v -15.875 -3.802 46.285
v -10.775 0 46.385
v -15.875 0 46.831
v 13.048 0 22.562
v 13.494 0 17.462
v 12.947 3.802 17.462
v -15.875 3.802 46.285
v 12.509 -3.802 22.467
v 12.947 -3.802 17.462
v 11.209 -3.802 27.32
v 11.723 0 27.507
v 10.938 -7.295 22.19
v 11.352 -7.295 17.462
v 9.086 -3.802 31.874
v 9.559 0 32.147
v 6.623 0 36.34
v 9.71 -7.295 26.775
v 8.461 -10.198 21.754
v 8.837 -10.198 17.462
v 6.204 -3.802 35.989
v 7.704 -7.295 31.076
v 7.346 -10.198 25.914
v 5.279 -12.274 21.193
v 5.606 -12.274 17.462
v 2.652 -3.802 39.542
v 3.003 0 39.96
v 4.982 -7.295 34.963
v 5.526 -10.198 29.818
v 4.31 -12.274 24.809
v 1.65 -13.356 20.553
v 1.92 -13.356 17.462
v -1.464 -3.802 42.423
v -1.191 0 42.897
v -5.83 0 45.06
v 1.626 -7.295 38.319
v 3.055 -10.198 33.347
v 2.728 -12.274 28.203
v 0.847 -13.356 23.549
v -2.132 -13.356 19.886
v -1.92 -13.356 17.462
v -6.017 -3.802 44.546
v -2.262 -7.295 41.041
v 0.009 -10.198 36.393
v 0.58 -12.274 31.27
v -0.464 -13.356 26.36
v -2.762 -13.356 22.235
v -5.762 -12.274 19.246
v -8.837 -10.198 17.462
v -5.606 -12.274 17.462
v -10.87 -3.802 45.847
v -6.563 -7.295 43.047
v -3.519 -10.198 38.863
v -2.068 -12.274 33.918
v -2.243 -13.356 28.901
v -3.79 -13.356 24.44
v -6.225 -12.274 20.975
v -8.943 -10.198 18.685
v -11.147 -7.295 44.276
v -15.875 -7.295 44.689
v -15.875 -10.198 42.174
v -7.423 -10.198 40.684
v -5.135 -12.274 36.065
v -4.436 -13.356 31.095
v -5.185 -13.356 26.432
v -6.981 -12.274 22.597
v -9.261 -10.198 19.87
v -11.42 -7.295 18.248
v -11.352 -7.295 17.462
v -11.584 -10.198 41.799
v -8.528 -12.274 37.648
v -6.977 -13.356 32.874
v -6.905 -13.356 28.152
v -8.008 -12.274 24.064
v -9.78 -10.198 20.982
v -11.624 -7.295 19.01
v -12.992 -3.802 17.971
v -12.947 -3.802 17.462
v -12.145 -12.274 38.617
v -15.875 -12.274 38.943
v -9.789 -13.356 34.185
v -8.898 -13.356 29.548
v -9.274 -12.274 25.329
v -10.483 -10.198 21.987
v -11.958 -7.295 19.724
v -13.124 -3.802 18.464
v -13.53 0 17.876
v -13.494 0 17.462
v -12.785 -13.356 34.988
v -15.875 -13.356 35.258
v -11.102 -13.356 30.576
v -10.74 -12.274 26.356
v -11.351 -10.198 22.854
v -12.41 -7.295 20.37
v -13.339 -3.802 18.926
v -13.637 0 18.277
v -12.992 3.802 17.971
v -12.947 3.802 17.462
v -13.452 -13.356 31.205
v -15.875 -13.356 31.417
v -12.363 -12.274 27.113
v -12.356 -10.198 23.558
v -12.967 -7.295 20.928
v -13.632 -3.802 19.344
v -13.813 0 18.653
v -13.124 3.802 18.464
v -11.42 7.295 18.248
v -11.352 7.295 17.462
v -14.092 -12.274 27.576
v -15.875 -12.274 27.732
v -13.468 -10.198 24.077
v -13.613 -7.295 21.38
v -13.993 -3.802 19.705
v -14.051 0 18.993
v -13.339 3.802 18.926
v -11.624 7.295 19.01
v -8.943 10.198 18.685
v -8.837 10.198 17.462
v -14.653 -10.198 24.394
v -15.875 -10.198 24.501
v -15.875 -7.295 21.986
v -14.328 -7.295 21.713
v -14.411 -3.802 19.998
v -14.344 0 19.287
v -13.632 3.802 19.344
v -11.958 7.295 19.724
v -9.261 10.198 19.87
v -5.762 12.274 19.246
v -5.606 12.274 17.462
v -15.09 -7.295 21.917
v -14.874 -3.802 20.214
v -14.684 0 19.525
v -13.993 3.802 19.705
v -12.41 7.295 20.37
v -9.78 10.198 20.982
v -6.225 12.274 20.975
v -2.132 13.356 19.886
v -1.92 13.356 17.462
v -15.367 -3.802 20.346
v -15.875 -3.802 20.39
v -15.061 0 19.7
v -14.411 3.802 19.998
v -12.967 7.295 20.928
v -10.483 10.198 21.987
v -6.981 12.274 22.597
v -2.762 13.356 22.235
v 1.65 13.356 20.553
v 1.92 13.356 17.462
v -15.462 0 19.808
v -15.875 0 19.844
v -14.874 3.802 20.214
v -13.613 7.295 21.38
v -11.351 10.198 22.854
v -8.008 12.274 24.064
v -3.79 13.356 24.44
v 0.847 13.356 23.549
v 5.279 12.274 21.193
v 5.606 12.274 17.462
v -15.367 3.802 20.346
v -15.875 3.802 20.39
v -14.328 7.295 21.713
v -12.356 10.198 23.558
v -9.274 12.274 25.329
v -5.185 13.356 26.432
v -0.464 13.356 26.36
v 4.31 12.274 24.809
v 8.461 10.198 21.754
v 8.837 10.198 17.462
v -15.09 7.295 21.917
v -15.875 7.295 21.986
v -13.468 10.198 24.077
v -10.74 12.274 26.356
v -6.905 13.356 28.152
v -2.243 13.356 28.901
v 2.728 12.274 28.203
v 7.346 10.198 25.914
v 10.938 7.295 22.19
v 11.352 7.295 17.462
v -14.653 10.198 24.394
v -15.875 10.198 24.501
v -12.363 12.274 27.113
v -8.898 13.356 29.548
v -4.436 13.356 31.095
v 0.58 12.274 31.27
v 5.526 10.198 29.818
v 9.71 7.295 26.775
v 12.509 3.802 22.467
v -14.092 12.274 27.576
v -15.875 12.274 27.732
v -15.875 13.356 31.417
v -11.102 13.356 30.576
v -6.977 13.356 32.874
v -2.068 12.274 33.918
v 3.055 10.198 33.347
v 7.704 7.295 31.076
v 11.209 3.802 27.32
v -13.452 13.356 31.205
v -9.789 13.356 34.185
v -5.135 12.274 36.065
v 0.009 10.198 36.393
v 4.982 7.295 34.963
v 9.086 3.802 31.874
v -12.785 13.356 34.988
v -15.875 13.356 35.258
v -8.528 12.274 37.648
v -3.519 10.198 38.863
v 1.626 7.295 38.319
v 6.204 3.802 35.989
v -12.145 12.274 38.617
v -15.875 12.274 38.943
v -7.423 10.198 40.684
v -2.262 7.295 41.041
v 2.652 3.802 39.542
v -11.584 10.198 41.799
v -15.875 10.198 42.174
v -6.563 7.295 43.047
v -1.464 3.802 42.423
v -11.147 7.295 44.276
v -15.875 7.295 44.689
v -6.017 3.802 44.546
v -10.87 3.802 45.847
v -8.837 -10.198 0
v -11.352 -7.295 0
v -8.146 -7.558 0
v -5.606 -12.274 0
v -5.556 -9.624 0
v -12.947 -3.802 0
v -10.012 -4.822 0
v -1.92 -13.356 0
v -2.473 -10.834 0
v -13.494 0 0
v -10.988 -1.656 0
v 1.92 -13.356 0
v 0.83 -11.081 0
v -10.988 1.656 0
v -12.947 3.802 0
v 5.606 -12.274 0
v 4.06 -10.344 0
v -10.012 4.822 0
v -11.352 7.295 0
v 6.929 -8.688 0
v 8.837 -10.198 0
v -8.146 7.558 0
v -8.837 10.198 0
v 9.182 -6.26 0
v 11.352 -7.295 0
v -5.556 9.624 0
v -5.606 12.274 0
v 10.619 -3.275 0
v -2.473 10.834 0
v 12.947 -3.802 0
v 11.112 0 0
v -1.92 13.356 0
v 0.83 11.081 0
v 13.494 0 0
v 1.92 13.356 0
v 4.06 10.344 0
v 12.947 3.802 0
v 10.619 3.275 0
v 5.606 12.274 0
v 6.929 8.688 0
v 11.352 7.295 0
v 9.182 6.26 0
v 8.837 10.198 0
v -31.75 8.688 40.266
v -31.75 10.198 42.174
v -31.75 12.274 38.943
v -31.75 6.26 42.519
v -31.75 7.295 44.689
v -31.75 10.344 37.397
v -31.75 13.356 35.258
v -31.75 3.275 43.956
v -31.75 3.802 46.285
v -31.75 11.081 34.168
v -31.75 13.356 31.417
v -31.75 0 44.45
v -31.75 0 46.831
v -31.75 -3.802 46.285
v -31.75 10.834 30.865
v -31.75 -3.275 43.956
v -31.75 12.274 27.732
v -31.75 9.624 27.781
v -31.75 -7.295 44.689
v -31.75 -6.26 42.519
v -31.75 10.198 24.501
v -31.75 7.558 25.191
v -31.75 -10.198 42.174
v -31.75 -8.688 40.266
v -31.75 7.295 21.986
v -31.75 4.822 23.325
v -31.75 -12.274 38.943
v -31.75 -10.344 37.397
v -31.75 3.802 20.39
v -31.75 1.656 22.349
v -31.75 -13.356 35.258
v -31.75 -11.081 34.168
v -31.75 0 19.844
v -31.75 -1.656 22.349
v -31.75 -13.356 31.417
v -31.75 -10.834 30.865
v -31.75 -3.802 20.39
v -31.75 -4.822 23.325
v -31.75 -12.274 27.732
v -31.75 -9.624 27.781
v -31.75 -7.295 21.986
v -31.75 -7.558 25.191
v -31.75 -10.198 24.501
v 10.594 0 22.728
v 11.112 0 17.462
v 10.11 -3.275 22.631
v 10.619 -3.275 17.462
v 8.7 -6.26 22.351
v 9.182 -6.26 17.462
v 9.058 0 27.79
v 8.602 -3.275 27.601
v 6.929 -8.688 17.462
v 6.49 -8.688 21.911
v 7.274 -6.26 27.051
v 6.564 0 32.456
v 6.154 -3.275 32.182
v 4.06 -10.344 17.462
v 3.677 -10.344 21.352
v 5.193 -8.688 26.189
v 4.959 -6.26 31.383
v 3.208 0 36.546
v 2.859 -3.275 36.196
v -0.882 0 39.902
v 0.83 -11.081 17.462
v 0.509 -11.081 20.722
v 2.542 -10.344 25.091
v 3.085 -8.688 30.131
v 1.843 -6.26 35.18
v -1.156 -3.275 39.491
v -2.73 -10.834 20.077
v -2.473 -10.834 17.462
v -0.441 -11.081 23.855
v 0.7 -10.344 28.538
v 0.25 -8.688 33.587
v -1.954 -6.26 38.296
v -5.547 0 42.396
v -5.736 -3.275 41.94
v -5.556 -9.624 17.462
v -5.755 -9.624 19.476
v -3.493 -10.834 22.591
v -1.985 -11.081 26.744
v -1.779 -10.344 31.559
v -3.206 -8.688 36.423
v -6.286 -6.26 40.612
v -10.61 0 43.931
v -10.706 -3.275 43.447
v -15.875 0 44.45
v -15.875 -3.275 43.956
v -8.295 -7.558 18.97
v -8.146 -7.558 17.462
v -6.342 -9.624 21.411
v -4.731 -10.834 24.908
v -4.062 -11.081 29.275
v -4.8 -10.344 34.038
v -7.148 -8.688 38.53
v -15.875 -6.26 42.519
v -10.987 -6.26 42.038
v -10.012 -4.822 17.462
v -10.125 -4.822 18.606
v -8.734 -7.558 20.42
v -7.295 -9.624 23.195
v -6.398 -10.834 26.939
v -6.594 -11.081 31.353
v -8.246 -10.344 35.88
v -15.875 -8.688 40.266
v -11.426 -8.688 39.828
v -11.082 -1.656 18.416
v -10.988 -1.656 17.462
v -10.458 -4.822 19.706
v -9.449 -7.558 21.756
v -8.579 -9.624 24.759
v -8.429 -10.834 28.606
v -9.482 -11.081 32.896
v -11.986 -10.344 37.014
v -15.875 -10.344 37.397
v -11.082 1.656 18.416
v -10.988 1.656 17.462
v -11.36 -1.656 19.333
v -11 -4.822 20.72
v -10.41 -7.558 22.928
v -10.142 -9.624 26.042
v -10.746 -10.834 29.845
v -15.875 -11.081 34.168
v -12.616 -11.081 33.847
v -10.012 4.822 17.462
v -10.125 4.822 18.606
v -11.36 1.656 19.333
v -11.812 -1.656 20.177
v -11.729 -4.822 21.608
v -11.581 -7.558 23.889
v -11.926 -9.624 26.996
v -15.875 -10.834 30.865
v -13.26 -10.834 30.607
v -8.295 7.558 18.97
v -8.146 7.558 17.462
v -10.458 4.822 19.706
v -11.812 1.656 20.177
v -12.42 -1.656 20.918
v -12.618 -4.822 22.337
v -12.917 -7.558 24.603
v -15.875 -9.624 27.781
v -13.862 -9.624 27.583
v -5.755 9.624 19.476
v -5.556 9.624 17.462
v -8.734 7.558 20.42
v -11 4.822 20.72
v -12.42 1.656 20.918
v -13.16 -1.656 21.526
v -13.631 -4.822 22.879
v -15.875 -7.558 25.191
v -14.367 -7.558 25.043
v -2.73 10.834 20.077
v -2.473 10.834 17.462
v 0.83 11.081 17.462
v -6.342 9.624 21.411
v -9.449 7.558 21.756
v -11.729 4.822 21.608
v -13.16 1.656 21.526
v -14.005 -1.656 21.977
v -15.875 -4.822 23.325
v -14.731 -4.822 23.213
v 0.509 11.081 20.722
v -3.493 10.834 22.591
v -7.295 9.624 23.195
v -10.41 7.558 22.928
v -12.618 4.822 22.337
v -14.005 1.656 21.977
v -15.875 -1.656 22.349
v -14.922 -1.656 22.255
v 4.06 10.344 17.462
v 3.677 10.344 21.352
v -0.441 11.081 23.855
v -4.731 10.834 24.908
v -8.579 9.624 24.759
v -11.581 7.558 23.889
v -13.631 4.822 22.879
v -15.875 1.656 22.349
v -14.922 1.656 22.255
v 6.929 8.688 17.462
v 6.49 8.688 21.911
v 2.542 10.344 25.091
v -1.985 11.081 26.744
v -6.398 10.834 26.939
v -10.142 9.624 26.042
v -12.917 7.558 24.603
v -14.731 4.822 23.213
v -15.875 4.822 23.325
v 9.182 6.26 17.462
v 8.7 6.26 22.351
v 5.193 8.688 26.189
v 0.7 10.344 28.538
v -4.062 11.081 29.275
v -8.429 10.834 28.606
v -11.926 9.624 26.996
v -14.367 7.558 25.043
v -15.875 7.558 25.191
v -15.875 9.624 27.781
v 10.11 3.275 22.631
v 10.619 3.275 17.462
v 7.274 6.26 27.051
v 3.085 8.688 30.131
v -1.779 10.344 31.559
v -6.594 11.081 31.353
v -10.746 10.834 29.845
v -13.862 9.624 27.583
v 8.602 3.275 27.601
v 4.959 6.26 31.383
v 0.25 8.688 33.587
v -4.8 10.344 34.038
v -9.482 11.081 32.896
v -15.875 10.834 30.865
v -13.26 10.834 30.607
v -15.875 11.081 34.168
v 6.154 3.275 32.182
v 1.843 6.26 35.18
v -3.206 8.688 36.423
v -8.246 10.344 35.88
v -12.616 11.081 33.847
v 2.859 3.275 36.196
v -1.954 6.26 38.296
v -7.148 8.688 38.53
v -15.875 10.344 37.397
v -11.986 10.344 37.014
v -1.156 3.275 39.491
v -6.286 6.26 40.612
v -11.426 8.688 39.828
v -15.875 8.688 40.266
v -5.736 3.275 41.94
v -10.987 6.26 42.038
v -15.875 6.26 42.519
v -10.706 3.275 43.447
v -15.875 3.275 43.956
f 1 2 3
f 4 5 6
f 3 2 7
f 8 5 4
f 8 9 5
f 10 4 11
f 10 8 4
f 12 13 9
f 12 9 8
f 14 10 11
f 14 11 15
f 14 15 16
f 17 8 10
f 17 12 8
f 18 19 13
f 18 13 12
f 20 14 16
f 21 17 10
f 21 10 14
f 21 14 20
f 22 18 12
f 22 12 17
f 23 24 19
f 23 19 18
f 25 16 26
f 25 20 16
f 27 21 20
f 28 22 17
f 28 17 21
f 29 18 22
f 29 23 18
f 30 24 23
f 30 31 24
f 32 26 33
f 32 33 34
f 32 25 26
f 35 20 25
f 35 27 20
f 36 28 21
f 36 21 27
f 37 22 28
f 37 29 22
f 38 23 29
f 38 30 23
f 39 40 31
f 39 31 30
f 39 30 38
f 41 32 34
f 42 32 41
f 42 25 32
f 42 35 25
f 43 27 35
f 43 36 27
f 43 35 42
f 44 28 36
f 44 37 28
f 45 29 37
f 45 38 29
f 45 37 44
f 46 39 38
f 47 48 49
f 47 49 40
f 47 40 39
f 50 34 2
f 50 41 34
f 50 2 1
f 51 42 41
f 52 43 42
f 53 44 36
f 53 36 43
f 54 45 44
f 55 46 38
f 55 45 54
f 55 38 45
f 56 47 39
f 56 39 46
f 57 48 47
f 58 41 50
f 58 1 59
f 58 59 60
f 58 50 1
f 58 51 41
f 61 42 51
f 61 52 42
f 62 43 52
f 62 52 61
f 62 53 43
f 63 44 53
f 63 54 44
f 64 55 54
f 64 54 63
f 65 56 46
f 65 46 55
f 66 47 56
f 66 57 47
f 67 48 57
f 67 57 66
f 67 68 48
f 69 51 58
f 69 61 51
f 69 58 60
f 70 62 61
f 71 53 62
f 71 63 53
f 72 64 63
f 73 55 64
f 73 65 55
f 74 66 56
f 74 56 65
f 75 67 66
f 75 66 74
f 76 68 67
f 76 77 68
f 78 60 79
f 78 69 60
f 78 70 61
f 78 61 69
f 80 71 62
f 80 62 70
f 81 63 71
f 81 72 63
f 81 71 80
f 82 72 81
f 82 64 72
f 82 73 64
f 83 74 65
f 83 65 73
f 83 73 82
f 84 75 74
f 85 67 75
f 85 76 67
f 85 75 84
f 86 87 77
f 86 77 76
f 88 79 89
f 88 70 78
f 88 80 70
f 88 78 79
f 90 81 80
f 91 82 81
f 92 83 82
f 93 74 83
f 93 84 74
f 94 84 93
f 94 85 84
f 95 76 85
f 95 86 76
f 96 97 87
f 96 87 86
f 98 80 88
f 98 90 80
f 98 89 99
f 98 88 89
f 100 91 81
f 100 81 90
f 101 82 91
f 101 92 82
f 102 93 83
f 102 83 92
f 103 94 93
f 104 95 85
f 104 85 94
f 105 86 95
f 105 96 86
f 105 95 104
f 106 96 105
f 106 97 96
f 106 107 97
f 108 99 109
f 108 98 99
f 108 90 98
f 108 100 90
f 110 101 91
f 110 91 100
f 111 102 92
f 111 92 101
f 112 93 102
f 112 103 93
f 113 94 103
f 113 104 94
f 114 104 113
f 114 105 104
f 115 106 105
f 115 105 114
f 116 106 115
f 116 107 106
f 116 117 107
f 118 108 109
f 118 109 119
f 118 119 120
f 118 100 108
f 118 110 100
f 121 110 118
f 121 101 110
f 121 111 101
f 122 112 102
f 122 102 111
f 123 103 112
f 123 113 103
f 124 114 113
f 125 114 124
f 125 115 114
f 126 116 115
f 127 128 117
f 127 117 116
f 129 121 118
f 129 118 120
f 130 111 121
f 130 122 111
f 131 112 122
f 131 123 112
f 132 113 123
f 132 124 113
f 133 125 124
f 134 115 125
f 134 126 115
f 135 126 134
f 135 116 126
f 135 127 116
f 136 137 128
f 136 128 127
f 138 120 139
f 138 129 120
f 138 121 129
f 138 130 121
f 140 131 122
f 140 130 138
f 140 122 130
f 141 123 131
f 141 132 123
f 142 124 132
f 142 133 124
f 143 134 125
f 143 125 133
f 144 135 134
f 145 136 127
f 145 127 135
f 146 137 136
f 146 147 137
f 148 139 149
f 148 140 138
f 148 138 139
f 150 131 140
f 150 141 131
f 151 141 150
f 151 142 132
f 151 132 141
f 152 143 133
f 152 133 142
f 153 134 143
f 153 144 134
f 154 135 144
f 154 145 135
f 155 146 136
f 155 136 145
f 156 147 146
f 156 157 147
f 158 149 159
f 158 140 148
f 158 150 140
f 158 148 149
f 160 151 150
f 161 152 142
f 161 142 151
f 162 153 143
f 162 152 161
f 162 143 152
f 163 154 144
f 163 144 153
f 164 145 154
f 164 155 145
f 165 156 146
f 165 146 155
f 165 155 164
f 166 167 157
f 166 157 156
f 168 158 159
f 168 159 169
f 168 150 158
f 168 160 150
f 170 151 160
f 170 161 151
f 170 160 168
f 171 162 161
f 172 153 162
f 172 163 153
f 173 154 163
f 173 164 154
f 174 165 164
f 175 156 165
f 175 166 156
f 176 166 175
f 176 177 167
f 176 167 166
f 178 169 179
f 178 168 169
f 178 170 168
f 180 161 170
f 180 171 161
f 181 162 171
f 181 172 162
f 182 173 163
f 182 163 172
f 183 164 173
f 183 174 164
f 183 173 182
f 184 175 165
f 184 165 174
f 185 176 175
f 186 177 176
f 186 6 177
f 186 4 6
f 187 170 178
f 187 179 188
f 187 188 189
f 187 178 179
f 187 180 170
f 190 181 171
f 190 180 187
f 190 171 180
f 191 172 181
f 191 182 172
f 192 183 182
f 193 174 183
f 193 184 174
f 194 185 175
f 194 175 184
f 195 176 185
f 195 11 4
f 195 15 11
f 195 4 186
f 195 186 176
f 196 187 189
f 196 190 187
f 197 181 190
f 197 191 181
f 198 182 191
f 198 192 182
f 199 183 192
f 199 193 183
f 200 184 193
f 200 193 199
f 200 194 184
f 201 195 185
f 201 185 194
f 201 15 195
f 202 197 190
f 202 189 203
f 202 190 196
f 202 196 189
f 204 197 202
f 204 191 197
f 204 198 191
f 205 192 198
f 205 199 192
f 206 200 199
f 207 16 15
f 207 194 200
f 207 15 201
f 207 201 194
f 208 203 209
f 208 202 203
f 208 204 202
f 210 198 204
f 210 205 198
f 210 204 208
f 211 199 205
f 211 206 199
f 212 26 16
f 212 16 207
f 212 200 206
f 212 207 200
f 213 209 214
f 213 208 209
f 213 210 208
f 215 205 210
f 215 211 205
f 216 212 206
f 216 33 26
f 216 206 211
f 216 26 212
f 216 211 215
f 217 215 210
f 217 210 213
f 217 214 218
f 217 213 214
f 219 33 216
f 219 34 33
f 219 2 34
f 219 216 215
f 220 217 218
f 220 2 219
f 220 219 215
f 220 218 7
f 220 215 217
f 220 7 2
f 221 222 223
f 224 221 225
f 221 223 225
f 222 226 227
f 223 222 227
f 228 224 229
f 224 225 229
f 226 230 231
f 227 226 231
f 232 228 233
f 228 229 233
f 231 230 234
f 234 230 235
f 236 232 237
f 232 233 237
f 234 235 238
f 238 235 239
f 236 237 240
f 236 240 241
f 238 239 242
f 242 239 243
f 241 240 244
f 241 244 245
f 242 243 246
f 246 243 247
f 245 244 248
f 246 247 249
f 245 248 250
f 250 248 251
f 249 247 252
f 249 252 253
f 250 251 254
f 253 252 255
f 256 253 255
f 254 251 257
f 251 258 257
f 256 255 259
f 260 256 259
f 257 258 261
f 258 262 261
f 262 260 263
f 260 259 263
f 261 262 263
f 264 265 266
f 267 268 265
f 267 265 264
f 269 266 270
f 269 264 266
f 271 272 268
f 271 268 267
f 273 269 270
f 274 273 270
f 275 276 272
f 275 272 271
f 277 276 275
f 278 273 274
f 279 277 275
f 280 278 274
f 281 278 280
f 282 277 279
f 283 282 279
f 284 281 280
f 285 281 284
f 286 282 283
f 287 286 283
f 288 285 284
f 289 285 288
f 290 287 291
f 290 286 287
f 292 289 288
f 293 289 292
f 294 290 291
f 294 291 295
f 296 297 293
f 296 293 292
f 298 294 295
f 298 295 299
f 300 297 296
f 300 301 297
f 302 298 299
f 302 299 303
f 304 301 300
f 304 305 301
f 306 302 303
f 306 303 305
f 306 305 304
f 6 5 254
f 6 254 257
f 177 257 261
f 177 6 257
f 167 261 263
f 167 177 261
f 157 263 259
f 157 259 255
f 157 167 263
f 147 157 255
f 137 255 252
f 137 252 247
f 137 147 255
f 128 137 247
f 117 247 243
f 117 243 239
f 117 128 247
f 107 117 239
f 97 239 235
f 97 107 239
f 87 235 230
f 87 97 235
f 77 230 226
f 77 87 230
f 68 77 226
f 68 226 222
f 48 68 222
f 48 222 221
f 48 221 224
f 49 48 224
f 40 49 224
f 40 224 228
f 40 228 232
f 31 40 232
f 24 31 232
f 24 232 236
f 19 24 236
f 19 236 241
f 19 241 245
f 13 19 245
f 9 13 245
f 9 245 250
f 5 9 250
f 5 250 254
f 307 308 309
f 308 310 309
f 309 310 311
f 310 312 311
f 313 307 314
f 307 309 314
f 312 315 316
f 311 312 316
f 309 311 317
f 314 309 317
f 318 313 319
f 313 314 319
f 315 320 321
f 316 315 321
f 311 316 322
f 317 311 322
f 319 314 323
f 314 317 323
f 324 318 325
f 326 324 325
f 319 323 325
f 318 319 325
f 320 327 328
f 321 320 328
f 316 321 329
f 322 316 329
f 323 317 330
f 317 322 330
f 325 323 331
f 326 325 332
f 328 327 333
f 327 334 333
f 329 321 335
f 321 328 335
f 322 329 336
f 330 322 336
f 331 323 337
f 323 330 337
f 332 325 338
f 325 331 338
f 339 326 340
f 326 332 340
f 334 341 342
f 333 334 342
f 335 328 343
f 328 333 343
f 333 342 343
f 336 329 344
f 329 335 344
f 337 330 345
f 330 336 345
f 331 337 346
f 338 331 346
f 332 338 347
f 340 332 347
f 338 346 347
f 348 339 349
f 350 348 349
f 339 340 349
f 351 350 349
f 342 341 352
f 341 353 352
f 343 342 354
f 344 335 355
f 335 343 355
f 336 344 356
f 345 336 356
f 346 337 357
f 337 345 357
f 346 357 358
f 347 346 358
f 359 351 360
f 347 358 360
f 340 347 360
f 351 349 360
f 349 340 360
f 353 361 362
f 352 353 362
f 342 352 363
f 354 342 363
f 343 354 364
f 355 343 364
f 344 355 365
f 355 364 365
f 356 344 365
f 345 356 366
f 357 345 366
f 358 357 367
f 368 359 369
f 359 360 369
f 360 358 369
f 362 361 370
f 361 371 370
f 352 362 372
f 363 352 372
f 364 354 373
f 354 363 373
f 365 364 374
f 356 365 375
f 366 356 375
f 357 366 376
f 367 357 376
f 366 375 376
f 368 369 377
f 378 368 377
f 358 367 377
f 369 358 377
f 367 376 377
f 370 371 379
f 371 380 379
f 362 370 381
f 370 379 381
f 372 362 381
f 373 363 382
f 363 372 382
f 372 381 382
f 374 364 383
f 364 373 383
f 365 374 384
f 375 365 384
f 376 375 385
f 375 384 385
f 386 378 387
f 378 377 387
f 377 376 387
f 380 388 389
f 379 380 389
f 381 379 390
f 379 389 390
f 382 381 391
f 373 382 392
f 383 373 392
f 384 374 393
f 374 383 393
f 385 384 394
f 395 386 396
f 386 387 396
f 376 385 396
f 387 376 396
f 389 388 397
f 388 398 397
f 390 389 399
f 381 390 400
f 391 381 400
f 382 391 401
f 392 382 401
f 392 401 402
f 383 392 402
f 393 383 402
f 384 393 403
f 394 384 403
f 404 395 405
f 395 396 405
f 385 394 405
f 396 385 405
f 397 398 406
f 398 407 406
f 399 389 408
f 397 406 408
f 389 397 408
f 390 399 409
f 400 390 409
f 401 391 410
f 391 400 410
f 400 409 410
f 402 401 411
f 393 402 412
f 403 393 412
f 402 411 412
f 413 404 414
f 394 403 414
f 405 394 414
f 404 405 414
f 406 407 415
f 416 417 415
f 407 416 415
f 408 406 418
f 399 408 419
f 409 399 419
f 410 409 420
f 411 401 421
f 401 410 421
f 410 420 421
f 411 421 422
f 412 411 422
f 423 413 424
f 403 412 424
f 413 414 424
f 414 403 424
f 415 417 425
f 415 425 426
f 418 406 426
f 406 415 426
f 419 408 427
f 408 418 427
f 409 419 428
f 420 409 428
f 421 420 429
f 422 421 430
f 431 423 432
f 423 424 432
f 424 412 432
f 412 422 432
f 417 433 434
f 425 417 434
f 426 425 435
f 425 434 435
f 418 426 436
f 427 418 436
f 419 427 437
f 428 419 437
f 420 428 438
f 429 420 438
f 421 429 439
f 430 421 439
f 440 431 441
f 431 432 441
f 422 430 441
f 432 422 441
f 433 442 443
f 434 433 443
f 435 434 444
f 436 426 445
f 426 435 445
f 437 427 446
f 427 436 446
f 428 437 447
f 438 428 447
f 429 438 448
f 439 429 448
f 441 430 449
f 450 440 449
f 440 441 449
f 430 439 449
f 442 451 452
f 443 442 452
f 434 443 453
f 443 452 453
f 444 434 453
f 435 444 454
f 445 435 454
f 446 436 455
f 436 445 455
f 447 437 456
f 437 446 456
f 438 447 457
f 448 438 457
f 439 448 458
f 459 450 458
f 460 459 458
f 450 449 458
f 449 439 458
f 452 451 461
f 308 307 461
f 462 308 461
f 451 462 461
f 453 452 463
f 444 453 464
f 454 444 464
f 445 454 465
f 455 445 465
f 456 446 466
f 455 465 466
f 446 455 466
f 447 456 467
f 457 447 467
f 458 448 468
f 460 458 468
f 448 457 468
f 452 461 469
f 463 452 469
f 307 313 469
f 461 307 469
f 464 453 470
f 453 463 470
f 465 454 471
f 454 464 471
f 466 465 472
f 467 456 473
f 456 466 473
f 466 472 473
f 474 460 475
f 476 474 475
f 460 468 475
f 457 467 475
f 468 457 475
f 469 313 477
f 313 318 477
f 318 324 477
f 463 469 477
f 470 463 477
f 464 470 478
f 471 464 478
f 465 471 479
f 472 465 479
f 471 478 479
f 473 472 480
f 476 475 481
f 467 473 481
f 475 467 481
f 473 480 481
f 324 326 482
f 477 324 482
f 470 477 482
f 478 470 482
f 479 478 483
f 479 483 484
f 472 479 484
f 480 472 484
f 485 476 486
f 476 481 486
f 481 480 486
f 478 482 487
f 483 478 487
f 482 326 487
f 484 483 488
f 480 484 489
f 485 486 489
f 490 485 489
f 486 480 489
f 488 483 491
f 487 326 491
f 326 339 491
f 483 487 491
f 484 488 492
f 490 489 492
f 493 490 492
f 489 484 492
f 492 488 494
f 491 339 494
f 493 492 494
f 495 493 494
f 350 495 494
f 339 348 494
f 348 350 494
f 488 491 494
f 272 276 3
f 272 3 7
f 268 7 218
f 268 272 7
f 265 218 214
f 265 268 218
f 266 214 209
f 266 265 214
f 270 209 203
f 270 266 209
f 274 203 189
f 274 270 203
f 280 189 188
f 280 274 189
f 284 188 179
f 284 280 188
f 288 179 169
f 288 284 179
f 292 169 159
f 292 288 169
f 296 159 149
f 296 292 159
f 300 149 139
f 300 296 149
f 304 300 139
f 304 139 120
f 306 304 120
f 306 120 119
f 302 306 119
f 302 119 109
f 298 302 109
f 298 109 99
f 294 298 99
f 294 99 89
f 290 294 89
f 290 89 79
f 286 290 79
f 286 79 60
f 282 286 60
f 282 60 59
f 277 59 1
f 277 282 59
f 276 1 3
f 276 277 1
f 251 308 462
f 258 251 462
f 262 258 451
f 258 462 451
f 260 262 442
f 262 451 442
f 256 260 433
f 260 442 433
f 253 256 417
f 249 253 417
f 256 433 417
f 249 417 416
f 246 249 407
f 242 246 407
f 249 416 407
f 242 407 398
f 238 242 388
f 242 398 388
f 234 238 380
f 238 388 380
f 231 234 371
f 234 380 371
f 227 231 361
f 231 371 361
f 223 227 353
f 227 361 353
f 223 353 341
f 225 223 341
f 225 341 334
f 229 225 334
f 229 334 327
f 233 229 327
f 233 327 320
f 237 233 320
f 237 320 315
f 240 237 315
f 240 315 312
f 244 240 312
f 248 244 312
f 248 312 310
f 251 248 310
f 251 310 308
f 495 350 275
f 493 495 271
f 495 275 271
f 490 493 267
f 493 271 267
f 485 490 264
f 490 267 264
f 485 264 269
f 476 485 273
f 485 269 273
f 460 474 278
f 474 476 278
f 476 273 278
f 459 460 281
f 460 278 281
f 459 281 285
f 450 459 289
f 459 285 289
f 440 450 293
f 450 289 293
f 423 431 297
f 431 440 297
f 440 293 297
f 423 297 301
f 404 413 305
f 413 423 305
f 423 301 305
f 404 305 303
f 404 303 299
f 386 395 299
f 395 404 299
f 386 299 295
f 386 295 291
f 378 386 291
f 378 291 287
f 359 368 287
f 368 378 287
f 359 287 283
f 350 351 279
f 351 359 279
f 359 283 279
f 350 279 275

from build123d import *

# Parameters (mm, degrees)
F1_R = 13.49375
F3_R = 11.1125


with BuildPart() as f2:
    # F2: sweep along a path in F0
    with BuildLine(Plane.XZ) as f2_path:
        Line((0, 0), (0, 17.4625))
        ThreePointArc((0, 17.4625), (-4.6496798487, 28.6878201513), (-15.875, 33.3375))
        Line((-15.875, 33.3375), (-31.75, 33.3375))
    # F1 (on Top) → F2 (sweep)
    with BuildSketch(Plane.XY):
        Circle(F1_R)
    sweep(path=f2_path.line)

    # F4: sweep along a path in F0
    with BuildLine(Plane.XZ) as f4_path:
        Line((0, 0), (0, 17.4625))
        ThreePointArc((0, 17.4625), (-4.6496798487, 28.6878201513), (-15.875, 33.3375))
        Line((-15.875, 33.3375), (-31.75, 33.3375))
    # F3 (on face) → F4 (sweep, cut)
    with BuildSketch(Plane(origin=(0, 0, 0), x_dir=(1, 0, 0), z_dir=(0, 0, -1))):
        Circle(F3_R)
    sweep(path=f4_path.line, mode=Mode.SUBTRACT)


solid = f2.part
